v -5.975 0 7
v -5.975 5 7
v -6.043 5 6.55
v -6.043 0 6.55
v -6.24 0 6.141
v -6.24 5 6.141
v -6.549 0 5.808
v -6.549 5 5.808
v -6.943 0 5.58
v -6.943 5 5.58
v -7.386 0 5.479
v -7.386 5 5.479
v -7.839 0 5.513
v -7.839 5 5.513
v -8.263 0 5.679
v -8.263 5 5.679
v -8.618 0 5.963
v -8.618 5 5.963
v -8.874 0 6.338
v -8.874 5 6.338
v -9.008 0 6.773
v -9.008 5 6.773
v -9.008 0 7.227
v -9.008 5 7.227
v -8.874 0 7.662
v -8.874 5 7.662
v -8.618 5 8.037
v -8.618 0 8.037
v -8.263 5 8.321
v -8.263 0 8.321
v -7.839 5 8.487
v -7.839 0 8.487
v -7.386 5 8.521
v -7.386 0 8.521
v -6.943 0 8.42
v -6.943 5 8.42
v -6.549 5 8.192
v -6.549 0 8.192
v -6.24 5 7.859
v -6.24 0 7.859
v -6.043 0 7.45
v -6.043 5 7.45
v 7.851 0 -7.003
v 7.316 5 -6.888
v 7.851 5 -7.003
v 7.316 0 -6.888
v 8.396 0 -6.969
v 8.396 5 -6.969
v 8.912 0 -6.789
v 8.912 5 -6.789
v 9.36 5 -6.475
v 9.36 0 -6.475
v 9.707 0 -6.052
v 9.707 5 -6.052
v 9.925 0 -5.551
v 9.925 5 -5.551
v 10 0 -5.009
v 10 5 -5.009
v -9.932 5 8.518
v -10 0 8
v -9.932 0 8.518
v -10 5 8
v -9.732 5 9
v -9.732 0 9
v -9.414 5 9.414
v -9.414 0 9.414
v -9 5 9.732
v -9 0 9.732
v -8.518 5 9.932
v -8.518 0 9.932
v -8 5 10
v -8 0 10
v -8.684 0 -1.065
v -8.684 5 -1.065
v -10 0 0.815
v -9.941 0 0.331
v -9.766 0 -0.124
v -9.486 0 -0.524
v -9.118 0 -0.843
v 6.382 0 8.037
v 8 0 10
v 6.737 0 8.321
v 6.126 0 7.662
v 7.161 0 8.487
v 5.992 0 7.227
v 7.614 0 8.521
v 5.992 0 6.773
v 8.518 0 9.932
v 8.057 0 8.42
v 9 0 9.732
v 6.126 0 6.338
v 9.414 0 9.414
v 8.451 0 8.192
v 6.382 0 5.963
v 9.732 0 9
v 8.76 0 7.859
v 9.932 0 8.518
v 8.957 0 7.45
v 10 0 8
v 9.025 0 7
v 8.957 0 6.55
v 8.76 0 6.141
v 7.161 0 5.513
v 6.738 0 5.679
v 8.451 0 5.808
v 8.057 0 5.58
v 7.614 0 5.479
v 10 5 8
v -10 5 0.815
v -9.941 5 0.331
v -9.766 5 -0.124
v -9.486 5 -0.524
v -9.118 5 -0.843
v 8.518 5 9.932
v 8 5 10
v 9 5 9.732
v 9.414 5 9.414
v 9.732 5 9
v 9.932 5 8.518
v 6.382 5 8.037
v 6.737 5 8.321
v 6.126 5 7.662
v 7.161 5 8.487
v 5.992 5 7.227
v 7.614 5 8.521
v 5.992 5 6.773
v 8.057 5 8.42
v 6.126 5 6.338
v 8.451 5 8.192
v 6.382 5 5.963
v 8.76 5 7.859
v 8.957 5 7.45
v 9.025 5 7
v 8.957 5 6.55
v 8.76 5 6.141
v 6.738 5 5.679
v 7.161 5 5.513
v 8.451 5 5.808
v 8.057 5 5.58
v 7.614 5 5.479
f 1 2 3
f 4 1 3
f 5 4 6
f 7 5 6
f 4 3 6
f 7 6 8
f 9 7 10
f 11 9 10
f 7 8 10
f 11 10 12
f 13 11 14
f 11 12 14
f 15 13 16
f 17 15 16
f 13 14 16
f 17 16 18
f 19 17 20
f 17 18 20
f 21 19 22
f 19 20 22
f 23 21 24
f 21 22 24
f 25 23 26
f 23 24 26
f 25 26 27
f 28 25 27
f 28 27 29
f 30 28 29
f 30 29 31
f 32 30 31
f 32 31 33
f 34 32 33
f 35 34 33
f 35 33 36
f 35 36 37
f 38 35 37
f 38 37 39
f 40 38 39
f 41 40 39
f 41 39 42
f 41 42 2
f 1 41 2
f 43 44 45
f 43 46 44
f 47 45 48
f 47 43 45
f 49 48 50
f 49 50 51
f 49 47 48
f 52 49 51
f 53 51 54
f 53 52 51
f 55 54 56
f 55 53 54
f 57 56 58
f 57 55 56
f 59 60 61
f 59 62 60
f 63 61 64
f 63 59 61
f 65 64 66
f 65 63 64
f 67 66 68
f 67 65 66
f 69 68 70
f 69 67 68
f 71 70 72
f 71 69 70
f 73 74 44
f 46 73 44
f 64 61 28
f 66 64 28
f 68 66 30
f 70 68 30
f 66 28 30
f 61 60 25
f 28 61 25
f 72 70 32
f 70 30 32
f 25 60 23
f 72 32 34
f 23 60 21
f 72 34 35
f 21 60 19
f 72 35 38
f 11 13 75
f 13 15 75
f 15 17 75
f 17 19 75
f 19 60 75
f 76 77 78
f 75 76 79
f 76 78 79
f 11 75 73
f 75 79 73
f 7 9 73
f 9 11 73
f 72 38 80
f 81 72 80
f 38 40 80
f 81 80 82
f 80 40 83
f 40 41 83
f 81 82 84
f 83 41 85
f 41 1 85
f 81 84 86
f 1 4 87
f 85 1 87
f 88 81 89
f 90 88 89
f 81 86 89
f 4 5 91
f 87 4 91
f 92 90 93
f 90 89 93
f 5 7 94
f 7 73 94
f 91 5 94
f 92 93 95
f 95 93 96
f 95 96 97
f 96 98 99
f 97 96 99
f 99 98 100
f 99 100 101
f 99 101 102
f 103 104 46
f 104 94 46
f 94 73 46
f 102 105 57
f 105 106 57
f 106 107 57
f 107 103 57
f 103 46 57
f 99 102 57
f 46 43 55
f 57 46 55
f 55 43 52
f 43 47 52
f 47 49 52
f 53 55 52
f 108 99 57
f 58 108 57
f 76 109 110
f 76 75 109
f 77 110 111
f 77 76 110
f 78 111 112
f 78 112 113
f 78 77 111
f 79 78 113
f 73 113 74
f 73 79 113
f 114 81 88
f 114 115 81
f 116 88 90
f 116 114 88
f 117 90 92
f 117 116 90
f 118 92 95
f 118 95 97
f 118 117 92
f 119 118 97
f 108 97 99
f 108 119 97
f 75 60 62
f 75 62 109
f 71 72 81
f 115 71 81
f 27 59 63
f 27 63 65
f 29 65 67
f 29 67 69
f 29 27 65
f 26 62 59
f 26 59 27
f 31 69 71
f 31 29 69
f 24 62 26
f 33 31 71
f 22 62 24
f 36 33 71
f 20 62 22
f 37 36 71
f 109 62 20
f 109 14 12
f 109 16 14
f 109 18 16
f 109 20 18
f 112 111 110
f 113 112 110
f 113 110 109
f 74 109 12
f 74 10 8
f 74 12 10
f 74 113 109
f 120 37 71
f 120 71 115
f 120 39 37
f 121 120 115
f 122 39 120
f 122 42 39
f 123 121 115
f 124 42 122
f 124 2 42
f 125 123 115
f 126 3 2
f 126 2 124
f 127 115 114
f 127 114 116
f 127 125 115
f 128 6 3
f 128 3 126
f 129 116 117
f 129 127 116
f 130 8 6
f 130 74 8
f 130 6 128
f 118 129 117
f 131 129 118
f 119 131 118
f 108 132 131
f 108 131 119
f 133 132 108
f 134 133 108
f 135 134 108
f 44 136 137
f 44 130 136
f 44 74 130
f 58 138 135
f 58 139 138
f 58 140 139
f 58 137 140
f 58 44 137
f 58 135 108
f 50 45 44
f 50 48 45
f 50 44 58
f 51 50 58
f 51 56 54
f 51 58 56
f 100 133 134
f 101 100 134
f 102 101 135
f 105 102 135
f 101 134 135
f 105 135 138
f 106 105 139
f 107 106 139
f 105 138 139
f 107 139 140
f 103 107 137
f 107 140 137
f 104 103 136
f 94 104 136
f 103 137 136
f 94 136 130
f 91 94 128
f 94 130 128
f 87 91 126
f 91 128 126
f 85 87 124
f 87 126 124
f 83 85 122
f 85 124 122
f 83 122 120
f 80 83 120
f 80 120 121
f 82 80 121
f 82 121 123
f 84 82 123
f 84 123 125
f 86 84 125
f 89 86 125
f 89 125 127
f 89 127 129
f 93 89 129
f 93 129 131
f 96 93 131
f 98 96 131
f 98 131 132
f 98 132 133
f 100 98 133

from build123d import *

# Parameters (mm, degrees)
SKETCH_1_W          = 20
SKETCH_1_H          = 20
EXTRUDE_1_DEPTH     = 5
SKETCH_2_R          = 1.525
CUT_EXTRUDE_1_DEPTH = 10
CUT_EXTRUDE_2_DEPTH = 6
FILLET_2_R          = 2


with BuildPart() as part:
    # 草图1 → 凸台-拉伸1 (new body)
    with BuildSketch(Plane(origin=(0, 0, 0), x_dir=(1, 0, 0), z_dir=(0, 1, 0))):
        Rectangle(SKETCH_1_W, SKETCH_1_H)
    extrude(amount=EXTRUDE_1_DEPTH)

    # 草图2 → 切除-拉伸1 (cut)
    with BuildSketch(Plane(origin=(0, 5, 0), x_dir=(1, 0, 0), z_dir=(0, 1, 0))):
        with Locations((-7.5, -7)):
            Circle(SKETCH_2_R)
        with Locations((7.5, -7)):
            Circle(SKETCH_2_R)
    extrude(amount=-CUT_EXTRUDE_1_DEPTH, mode=Mode.SUBTRACT)

    # 草图3 → 切除-拉伸2 (cut, through all)
    with BuildSketch(Plane(origin=(0, 5, 0), x_dir=(1, 0, 0), z_dir=(0, 1, 0))):
        Polygon((-10, 10), (-10, 0.585811222), (10, 7.865215908), (10, 10), align=None)
    extrude(amount=-CUT_EXTRUDE_2_DEPTH, mode=Mode.SUBTRACT)

    # 圆角2
    fillet_2_edges = [part.edges().sort_by_distance(p)[0] for p in [
        (-10, 2.5, -0.585811222),
        (10, 2.5, -7.865215908),
        (10, 2.5, 10),
        (-10, 2.5, 10),
    ]]
    fillet(fillet_2_edges, radius=FILLET_2_R)


solid = part.part
